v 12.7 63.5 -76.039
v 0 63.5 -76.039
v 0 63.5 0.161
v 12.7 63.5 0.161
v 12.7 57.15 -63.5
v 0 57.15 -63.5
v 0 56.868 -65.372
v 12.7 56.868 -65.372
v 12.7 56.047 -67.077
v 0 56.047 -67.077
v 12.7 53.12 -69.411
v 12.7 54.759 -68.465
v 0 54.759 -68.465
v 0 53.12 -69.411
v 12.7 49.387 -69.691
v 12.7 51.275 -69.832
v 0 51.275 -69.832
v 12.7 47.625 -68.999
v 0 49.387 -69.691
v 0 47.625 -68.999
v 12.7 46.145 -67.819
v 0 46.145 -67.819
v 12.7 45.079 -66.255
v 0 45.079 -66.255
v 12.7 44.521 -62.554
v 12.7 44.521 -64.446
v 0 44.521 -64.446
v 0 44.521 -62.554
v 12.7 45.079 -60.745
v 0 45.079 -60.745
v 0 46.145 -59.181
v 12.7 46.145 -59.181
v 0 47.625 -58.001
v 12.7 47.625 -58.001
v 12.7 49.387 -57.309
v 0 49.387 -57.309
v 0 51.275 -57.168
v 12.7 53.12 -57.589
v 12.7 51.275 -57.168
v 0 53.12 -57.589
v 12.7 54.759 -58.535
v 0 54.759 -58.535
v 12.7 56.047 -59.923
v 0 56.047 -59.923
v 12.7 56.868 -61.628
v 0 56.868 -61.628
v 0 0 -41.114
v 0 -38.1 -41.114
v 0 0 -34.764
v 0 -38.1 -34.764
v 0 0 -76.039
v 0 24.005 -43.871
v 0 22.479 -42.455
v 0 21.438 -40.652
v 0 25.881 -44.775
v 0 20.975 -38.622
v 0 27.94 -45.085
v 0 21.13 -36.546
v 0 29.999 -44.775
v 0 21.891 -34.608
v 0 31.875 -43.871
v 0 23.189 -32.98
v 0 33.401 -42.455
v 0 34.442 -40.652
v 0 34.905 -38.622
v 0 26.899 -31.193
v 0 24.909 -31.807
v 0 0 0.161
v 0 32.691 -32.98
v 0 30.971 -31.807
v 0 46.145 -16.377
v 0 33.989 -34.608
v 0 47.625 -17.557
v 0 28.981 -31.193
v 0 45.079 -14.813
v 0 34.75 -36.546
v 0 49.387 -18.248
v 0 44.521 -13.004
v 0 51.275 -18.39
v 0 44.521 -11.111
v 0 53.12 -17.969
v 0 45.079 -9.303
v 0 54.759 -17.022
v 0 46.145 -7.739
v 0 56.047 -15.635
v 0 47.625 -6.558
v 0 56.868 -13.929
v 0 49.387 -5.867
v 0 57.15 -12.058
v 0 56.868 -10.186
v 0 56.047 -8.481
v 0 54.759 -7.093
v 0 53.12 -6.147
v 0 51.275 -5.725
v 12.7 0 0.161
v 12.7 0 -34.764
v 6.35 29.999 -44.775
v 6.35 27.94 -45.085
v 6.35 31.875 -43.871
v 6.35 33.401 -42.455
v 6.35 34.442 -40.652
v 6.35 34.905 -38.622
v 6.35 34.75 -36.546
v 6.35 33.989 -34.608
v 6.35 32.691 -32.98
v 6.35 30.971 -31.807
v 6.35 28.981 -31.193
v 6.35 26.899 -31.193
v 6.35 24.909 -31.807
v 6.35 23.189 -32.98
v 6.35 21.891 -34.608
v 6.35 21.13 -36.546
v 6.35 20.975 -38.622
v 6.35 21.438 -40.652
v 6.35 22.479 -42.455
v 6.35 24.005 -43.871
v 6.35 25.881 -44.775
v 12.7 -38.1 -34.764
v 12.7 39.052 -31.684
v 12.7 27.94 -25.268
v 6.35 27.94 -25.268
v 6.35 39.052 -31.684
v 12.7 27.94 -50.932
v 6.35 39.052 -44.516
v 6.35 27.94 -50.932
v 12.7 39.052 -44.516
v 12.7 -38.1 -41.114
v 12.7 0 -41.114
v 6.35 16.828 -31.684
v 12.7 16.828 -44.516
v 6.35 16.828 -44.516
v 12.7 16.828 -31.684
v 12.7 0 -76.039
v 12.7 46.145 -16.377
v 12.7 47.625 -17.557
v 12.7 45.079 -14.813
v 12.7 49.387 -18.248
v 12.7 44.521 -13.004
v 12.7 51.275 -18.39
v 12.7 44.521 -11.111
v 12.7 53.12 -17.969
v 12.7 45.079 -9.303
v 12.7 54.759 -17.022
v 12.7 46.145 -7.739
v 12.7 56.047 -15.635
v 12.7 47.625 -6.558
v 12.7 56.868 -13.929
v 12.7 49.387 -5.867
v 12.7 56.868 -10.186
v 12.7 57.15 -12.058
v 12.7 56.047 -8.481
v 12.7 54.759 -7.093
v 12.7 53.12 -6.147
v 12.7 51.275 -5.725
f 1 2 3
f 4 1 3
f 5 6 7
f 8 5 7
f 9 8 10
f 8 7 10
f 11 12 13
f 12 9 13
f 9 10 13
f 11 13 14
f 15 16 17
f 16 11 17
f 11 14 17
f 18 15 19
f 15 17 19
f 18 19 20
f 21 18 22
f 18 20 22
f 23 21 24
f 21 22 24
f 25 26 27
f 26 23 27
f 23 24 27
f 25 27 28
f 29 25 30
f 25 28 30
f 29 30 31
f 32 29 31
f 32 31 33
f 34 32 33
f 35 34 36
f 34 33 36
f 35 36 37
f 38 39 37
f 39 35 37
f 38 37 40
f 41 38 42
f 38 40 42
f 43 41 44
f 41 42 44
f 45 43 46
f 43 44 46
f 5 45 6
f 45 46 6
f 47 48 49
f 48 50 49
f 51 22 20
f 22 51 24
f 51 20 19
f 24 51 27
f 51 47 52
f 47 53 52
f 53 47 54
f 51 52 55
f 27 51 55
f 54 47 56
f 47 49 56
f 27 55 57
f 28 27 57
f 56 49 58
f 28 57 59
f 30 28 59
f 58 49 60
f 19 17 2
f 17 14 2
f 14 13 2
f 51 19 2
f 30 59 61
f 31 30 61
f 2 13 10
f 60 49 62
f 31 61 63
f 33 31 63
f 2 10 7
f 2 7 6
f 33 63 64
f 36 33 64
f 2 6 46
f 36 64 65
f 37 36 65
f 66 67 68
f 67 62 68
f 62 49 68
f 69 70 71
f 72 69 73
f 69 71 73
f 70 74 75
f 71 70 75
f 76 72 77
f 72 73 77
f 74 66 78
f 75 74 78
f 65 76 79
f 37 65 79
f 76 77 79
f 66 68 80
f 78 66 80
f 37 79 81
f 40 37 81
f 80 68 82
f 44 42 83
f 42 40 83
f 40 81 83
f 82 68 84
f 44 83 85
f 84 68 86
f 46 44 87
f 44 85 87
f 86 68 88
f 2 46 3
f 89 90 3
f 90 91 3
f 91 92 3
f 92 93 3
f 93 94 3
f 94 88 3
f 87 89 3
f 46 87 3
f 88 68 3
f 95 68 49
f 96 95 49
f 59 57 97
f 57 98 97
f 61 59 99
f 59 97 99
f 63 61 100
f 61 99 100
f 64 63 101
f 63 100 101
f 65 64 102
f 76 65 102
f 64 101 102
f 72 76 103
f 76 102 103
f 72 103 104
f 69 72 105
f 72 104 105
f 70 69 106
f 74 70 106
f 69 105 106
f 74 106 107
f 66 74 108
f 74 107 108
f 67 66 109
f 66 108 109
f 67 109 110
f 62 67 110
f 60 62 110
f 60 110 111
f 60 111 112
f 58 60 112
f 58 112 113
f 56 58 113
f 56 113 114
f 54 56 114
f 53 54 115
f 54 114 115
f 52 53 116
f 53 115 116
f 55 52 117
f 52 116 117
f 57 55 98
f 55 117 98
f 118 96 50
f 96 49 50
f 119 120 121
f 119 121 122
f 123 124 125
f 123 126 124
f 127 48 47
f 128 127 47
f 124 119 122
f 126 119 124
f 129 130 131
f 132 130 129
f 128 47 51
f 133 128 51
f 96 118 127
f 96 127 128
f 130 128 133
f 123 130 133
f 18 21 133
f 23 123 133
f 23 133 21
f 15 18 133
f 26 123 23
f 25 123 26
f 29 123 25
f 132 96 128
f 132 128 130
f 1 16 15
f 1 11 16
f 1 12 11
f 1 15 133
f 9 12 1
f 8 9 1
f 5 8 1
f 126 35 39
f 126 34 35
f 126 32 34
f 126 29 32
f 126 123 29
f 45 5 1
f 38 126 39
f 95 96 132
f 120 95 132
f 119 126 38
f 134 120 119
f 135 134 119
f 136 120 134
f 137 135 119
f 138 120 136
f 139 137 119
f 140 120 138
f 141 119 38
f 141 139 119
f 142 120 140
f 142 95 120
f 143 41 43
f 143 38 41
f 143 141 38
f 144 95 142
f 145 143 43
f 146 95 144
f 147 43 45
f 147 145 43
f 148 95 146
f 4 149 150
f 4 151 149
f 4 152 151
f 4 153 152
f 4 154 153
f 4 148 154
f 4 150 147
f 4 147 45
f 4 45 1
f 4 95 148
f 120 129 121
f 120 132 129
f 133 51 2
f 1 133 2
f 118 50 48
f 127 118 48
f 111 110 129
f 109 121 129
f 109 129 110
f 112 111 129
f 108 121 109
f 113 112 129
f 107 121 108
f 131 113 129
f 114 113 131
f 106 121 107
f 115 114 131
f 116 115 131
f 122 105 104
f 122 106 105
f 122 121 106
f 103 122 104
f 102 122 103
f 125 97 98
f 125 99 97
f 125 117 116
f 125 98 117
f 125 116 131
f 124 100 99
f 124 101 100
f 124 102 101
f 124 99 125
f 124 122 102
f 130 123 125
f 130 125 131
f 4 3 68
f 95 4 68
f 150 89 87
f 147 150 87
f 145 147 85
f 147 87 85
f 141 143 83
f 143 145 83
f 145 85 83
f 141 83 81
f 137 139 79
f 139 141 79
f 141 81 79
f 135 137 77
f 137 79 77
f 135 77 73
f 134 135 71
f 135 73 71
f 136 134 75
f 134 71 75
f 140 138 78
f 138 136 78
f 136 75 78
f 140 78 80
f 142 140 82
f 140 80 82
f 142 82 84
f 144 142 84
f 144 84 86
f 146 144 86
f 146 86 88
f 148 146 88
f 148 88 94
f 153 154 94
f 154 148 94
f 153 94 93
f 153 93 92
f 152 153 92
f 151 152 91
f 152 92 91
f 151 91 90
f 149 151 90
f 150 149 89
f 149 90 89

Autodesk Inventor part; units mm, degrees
ref_plane "YZ Plane" through (0, 0, 0) normal (1, 0, 0) x (0, 1, 0)
ref_plane "XZ Plane" through (0, 0, 0) normal (0, 1, 0) x (-1, 0, 0)
ref_plane "XY Plane" through (0, 0, 0) normal (0, 0, 1) x (1, 0, 0)
sketch "Sketch1" plane through (0, 0, 0) normal (1, 0, 0) x (0, 1, 0)
  circle A0 centre (27.94, -38.1) radius 6.985 construction
  circle A1 centre (50.8, -12.0577) radius 6.35
  line L0 (63.5, 0.1606) -> (50.8, 0.1606) construction
  line L1 (50.8, 0.1606) -> (50.8, -12.5394) construction
  line L2 (50.8, -12.5394) -> (63.5, -12.5394) construction
  line L3 (63.5, -12.5394) -> (63.5, 0.1606) construction
  circle A2 centre (50.8, -63.5) radius 6.35
  line L4 (16.8275, -31.6842) -> (27.94, -25.2684) construction
  line L5 (27.94, -25.2684) -> (39.0525, -31.6842) construction
  line L6 (39.0525, -31.6842) -> (39.0525, -44.5158) construction
  line L7 (39.0525, -44.5158) -> (27.94, -50.9316) construction
  line L8 (27.94, -50.9316) -> (16.8275, -44.5158) construction
  line L9 (16.8275, -44.5158) -> (16.8275, -31.6842) construction
  line L10 (0, -34.7644) -> (-38.1, -34.7644)
  line L11 (-38.1, -34.7644) -> (-38.1, -41.1144)
  line L12 (-38.1, -41.1144) -> (0, -41.1144)
  line L13 (63.5, 0.1606) -> (0, 0.1606)
  line L14 (0, -76.0394) -> (63.5, -76.0394)
  line L15 (63.5, -76.0394) -> (63.5, 0.1606)
  line L16 (0, 0.1606) -> (0, -34.7644)
  line L17 (0, -41.1144) -> (0, -76.0394)
  line L18 (0, -37.9394) -> (27.94, -37.9394) construction
  line L19 (0, -37.9394) -> (27.94, -37.9394) construction
  point P0 (0, 0)
  dimension "d9" = 13.97
  dimension "d12" = 12.7
  dimension "d13" = 12.7
  dimension "d18" = 22.225
  dimension "d21" = 38.1
  dimension "d22" = 6.35
  dimension "d23" = 63.5
  dimension "d24" = 76.2
  dimension "d38" = 38.1
  dimension "d41" = 27.94
  dimension "d42" = 0
  dimension "d43" = 34.925
  dimension "d44" = 38.1
extrude "Extrusion3" add sketch "Sketch1" along normal blind 12.7
sketch "Sketch2" plane through (12.7, 0, 0) normal (1, 0, 0) x (0, 0, -1)
  line L0 (0, 0) -> (38.1, 0) construction
  line L1 (38.1, 0) -> (38.1, 27.94) construction
  line L2 (31.6842, 16.8275) -> (25.2684, 27.94)
  line L3 (25.2684, 27.94) -> (31.6842, 39.0525)
  line L4 (31.6842, 39.0525) -> (44.5158, 39.0525)
  line L5 (44.5158, 39.0525) -> (50.9316, 27.94)
  line L6 (50.9316, 27.94) -> (44.5158, 16.8275)
  line L7 (44.5158, 16.8275) -> (31.6842, 16.8275)
  point P0 (38.1, 16.8275)
  dimension "d29" = 38.1
  dimension "d30" = 27.94
  dimension "d31" = 90
  dimension "d32" = 22.225
extrude "Extrusion4" cut sketch "Sketch2" against normal blind 6.35
sketch "Sketch3" plane through (6.35, 0, 0) normal (1, 0, 0) x (0, 0, -1)
  line L0 (25.2684, 27.94) -> (31.6842, 39.0525) construction
  line L1 (31.6842, 39.0525) -> (44.5158, 16.8275) construction
  circle A0 centre (38.1, 27.94) radius 6.985
  point P0 (0, 0)
  dimension "d35" = 13.97
extrude "Extrusion5" cut sketch "Sketch3" along normal through all both and the other way through all
equation "\"d38\" = d21"
properties part number "Holder" material "PVC-Piping"
